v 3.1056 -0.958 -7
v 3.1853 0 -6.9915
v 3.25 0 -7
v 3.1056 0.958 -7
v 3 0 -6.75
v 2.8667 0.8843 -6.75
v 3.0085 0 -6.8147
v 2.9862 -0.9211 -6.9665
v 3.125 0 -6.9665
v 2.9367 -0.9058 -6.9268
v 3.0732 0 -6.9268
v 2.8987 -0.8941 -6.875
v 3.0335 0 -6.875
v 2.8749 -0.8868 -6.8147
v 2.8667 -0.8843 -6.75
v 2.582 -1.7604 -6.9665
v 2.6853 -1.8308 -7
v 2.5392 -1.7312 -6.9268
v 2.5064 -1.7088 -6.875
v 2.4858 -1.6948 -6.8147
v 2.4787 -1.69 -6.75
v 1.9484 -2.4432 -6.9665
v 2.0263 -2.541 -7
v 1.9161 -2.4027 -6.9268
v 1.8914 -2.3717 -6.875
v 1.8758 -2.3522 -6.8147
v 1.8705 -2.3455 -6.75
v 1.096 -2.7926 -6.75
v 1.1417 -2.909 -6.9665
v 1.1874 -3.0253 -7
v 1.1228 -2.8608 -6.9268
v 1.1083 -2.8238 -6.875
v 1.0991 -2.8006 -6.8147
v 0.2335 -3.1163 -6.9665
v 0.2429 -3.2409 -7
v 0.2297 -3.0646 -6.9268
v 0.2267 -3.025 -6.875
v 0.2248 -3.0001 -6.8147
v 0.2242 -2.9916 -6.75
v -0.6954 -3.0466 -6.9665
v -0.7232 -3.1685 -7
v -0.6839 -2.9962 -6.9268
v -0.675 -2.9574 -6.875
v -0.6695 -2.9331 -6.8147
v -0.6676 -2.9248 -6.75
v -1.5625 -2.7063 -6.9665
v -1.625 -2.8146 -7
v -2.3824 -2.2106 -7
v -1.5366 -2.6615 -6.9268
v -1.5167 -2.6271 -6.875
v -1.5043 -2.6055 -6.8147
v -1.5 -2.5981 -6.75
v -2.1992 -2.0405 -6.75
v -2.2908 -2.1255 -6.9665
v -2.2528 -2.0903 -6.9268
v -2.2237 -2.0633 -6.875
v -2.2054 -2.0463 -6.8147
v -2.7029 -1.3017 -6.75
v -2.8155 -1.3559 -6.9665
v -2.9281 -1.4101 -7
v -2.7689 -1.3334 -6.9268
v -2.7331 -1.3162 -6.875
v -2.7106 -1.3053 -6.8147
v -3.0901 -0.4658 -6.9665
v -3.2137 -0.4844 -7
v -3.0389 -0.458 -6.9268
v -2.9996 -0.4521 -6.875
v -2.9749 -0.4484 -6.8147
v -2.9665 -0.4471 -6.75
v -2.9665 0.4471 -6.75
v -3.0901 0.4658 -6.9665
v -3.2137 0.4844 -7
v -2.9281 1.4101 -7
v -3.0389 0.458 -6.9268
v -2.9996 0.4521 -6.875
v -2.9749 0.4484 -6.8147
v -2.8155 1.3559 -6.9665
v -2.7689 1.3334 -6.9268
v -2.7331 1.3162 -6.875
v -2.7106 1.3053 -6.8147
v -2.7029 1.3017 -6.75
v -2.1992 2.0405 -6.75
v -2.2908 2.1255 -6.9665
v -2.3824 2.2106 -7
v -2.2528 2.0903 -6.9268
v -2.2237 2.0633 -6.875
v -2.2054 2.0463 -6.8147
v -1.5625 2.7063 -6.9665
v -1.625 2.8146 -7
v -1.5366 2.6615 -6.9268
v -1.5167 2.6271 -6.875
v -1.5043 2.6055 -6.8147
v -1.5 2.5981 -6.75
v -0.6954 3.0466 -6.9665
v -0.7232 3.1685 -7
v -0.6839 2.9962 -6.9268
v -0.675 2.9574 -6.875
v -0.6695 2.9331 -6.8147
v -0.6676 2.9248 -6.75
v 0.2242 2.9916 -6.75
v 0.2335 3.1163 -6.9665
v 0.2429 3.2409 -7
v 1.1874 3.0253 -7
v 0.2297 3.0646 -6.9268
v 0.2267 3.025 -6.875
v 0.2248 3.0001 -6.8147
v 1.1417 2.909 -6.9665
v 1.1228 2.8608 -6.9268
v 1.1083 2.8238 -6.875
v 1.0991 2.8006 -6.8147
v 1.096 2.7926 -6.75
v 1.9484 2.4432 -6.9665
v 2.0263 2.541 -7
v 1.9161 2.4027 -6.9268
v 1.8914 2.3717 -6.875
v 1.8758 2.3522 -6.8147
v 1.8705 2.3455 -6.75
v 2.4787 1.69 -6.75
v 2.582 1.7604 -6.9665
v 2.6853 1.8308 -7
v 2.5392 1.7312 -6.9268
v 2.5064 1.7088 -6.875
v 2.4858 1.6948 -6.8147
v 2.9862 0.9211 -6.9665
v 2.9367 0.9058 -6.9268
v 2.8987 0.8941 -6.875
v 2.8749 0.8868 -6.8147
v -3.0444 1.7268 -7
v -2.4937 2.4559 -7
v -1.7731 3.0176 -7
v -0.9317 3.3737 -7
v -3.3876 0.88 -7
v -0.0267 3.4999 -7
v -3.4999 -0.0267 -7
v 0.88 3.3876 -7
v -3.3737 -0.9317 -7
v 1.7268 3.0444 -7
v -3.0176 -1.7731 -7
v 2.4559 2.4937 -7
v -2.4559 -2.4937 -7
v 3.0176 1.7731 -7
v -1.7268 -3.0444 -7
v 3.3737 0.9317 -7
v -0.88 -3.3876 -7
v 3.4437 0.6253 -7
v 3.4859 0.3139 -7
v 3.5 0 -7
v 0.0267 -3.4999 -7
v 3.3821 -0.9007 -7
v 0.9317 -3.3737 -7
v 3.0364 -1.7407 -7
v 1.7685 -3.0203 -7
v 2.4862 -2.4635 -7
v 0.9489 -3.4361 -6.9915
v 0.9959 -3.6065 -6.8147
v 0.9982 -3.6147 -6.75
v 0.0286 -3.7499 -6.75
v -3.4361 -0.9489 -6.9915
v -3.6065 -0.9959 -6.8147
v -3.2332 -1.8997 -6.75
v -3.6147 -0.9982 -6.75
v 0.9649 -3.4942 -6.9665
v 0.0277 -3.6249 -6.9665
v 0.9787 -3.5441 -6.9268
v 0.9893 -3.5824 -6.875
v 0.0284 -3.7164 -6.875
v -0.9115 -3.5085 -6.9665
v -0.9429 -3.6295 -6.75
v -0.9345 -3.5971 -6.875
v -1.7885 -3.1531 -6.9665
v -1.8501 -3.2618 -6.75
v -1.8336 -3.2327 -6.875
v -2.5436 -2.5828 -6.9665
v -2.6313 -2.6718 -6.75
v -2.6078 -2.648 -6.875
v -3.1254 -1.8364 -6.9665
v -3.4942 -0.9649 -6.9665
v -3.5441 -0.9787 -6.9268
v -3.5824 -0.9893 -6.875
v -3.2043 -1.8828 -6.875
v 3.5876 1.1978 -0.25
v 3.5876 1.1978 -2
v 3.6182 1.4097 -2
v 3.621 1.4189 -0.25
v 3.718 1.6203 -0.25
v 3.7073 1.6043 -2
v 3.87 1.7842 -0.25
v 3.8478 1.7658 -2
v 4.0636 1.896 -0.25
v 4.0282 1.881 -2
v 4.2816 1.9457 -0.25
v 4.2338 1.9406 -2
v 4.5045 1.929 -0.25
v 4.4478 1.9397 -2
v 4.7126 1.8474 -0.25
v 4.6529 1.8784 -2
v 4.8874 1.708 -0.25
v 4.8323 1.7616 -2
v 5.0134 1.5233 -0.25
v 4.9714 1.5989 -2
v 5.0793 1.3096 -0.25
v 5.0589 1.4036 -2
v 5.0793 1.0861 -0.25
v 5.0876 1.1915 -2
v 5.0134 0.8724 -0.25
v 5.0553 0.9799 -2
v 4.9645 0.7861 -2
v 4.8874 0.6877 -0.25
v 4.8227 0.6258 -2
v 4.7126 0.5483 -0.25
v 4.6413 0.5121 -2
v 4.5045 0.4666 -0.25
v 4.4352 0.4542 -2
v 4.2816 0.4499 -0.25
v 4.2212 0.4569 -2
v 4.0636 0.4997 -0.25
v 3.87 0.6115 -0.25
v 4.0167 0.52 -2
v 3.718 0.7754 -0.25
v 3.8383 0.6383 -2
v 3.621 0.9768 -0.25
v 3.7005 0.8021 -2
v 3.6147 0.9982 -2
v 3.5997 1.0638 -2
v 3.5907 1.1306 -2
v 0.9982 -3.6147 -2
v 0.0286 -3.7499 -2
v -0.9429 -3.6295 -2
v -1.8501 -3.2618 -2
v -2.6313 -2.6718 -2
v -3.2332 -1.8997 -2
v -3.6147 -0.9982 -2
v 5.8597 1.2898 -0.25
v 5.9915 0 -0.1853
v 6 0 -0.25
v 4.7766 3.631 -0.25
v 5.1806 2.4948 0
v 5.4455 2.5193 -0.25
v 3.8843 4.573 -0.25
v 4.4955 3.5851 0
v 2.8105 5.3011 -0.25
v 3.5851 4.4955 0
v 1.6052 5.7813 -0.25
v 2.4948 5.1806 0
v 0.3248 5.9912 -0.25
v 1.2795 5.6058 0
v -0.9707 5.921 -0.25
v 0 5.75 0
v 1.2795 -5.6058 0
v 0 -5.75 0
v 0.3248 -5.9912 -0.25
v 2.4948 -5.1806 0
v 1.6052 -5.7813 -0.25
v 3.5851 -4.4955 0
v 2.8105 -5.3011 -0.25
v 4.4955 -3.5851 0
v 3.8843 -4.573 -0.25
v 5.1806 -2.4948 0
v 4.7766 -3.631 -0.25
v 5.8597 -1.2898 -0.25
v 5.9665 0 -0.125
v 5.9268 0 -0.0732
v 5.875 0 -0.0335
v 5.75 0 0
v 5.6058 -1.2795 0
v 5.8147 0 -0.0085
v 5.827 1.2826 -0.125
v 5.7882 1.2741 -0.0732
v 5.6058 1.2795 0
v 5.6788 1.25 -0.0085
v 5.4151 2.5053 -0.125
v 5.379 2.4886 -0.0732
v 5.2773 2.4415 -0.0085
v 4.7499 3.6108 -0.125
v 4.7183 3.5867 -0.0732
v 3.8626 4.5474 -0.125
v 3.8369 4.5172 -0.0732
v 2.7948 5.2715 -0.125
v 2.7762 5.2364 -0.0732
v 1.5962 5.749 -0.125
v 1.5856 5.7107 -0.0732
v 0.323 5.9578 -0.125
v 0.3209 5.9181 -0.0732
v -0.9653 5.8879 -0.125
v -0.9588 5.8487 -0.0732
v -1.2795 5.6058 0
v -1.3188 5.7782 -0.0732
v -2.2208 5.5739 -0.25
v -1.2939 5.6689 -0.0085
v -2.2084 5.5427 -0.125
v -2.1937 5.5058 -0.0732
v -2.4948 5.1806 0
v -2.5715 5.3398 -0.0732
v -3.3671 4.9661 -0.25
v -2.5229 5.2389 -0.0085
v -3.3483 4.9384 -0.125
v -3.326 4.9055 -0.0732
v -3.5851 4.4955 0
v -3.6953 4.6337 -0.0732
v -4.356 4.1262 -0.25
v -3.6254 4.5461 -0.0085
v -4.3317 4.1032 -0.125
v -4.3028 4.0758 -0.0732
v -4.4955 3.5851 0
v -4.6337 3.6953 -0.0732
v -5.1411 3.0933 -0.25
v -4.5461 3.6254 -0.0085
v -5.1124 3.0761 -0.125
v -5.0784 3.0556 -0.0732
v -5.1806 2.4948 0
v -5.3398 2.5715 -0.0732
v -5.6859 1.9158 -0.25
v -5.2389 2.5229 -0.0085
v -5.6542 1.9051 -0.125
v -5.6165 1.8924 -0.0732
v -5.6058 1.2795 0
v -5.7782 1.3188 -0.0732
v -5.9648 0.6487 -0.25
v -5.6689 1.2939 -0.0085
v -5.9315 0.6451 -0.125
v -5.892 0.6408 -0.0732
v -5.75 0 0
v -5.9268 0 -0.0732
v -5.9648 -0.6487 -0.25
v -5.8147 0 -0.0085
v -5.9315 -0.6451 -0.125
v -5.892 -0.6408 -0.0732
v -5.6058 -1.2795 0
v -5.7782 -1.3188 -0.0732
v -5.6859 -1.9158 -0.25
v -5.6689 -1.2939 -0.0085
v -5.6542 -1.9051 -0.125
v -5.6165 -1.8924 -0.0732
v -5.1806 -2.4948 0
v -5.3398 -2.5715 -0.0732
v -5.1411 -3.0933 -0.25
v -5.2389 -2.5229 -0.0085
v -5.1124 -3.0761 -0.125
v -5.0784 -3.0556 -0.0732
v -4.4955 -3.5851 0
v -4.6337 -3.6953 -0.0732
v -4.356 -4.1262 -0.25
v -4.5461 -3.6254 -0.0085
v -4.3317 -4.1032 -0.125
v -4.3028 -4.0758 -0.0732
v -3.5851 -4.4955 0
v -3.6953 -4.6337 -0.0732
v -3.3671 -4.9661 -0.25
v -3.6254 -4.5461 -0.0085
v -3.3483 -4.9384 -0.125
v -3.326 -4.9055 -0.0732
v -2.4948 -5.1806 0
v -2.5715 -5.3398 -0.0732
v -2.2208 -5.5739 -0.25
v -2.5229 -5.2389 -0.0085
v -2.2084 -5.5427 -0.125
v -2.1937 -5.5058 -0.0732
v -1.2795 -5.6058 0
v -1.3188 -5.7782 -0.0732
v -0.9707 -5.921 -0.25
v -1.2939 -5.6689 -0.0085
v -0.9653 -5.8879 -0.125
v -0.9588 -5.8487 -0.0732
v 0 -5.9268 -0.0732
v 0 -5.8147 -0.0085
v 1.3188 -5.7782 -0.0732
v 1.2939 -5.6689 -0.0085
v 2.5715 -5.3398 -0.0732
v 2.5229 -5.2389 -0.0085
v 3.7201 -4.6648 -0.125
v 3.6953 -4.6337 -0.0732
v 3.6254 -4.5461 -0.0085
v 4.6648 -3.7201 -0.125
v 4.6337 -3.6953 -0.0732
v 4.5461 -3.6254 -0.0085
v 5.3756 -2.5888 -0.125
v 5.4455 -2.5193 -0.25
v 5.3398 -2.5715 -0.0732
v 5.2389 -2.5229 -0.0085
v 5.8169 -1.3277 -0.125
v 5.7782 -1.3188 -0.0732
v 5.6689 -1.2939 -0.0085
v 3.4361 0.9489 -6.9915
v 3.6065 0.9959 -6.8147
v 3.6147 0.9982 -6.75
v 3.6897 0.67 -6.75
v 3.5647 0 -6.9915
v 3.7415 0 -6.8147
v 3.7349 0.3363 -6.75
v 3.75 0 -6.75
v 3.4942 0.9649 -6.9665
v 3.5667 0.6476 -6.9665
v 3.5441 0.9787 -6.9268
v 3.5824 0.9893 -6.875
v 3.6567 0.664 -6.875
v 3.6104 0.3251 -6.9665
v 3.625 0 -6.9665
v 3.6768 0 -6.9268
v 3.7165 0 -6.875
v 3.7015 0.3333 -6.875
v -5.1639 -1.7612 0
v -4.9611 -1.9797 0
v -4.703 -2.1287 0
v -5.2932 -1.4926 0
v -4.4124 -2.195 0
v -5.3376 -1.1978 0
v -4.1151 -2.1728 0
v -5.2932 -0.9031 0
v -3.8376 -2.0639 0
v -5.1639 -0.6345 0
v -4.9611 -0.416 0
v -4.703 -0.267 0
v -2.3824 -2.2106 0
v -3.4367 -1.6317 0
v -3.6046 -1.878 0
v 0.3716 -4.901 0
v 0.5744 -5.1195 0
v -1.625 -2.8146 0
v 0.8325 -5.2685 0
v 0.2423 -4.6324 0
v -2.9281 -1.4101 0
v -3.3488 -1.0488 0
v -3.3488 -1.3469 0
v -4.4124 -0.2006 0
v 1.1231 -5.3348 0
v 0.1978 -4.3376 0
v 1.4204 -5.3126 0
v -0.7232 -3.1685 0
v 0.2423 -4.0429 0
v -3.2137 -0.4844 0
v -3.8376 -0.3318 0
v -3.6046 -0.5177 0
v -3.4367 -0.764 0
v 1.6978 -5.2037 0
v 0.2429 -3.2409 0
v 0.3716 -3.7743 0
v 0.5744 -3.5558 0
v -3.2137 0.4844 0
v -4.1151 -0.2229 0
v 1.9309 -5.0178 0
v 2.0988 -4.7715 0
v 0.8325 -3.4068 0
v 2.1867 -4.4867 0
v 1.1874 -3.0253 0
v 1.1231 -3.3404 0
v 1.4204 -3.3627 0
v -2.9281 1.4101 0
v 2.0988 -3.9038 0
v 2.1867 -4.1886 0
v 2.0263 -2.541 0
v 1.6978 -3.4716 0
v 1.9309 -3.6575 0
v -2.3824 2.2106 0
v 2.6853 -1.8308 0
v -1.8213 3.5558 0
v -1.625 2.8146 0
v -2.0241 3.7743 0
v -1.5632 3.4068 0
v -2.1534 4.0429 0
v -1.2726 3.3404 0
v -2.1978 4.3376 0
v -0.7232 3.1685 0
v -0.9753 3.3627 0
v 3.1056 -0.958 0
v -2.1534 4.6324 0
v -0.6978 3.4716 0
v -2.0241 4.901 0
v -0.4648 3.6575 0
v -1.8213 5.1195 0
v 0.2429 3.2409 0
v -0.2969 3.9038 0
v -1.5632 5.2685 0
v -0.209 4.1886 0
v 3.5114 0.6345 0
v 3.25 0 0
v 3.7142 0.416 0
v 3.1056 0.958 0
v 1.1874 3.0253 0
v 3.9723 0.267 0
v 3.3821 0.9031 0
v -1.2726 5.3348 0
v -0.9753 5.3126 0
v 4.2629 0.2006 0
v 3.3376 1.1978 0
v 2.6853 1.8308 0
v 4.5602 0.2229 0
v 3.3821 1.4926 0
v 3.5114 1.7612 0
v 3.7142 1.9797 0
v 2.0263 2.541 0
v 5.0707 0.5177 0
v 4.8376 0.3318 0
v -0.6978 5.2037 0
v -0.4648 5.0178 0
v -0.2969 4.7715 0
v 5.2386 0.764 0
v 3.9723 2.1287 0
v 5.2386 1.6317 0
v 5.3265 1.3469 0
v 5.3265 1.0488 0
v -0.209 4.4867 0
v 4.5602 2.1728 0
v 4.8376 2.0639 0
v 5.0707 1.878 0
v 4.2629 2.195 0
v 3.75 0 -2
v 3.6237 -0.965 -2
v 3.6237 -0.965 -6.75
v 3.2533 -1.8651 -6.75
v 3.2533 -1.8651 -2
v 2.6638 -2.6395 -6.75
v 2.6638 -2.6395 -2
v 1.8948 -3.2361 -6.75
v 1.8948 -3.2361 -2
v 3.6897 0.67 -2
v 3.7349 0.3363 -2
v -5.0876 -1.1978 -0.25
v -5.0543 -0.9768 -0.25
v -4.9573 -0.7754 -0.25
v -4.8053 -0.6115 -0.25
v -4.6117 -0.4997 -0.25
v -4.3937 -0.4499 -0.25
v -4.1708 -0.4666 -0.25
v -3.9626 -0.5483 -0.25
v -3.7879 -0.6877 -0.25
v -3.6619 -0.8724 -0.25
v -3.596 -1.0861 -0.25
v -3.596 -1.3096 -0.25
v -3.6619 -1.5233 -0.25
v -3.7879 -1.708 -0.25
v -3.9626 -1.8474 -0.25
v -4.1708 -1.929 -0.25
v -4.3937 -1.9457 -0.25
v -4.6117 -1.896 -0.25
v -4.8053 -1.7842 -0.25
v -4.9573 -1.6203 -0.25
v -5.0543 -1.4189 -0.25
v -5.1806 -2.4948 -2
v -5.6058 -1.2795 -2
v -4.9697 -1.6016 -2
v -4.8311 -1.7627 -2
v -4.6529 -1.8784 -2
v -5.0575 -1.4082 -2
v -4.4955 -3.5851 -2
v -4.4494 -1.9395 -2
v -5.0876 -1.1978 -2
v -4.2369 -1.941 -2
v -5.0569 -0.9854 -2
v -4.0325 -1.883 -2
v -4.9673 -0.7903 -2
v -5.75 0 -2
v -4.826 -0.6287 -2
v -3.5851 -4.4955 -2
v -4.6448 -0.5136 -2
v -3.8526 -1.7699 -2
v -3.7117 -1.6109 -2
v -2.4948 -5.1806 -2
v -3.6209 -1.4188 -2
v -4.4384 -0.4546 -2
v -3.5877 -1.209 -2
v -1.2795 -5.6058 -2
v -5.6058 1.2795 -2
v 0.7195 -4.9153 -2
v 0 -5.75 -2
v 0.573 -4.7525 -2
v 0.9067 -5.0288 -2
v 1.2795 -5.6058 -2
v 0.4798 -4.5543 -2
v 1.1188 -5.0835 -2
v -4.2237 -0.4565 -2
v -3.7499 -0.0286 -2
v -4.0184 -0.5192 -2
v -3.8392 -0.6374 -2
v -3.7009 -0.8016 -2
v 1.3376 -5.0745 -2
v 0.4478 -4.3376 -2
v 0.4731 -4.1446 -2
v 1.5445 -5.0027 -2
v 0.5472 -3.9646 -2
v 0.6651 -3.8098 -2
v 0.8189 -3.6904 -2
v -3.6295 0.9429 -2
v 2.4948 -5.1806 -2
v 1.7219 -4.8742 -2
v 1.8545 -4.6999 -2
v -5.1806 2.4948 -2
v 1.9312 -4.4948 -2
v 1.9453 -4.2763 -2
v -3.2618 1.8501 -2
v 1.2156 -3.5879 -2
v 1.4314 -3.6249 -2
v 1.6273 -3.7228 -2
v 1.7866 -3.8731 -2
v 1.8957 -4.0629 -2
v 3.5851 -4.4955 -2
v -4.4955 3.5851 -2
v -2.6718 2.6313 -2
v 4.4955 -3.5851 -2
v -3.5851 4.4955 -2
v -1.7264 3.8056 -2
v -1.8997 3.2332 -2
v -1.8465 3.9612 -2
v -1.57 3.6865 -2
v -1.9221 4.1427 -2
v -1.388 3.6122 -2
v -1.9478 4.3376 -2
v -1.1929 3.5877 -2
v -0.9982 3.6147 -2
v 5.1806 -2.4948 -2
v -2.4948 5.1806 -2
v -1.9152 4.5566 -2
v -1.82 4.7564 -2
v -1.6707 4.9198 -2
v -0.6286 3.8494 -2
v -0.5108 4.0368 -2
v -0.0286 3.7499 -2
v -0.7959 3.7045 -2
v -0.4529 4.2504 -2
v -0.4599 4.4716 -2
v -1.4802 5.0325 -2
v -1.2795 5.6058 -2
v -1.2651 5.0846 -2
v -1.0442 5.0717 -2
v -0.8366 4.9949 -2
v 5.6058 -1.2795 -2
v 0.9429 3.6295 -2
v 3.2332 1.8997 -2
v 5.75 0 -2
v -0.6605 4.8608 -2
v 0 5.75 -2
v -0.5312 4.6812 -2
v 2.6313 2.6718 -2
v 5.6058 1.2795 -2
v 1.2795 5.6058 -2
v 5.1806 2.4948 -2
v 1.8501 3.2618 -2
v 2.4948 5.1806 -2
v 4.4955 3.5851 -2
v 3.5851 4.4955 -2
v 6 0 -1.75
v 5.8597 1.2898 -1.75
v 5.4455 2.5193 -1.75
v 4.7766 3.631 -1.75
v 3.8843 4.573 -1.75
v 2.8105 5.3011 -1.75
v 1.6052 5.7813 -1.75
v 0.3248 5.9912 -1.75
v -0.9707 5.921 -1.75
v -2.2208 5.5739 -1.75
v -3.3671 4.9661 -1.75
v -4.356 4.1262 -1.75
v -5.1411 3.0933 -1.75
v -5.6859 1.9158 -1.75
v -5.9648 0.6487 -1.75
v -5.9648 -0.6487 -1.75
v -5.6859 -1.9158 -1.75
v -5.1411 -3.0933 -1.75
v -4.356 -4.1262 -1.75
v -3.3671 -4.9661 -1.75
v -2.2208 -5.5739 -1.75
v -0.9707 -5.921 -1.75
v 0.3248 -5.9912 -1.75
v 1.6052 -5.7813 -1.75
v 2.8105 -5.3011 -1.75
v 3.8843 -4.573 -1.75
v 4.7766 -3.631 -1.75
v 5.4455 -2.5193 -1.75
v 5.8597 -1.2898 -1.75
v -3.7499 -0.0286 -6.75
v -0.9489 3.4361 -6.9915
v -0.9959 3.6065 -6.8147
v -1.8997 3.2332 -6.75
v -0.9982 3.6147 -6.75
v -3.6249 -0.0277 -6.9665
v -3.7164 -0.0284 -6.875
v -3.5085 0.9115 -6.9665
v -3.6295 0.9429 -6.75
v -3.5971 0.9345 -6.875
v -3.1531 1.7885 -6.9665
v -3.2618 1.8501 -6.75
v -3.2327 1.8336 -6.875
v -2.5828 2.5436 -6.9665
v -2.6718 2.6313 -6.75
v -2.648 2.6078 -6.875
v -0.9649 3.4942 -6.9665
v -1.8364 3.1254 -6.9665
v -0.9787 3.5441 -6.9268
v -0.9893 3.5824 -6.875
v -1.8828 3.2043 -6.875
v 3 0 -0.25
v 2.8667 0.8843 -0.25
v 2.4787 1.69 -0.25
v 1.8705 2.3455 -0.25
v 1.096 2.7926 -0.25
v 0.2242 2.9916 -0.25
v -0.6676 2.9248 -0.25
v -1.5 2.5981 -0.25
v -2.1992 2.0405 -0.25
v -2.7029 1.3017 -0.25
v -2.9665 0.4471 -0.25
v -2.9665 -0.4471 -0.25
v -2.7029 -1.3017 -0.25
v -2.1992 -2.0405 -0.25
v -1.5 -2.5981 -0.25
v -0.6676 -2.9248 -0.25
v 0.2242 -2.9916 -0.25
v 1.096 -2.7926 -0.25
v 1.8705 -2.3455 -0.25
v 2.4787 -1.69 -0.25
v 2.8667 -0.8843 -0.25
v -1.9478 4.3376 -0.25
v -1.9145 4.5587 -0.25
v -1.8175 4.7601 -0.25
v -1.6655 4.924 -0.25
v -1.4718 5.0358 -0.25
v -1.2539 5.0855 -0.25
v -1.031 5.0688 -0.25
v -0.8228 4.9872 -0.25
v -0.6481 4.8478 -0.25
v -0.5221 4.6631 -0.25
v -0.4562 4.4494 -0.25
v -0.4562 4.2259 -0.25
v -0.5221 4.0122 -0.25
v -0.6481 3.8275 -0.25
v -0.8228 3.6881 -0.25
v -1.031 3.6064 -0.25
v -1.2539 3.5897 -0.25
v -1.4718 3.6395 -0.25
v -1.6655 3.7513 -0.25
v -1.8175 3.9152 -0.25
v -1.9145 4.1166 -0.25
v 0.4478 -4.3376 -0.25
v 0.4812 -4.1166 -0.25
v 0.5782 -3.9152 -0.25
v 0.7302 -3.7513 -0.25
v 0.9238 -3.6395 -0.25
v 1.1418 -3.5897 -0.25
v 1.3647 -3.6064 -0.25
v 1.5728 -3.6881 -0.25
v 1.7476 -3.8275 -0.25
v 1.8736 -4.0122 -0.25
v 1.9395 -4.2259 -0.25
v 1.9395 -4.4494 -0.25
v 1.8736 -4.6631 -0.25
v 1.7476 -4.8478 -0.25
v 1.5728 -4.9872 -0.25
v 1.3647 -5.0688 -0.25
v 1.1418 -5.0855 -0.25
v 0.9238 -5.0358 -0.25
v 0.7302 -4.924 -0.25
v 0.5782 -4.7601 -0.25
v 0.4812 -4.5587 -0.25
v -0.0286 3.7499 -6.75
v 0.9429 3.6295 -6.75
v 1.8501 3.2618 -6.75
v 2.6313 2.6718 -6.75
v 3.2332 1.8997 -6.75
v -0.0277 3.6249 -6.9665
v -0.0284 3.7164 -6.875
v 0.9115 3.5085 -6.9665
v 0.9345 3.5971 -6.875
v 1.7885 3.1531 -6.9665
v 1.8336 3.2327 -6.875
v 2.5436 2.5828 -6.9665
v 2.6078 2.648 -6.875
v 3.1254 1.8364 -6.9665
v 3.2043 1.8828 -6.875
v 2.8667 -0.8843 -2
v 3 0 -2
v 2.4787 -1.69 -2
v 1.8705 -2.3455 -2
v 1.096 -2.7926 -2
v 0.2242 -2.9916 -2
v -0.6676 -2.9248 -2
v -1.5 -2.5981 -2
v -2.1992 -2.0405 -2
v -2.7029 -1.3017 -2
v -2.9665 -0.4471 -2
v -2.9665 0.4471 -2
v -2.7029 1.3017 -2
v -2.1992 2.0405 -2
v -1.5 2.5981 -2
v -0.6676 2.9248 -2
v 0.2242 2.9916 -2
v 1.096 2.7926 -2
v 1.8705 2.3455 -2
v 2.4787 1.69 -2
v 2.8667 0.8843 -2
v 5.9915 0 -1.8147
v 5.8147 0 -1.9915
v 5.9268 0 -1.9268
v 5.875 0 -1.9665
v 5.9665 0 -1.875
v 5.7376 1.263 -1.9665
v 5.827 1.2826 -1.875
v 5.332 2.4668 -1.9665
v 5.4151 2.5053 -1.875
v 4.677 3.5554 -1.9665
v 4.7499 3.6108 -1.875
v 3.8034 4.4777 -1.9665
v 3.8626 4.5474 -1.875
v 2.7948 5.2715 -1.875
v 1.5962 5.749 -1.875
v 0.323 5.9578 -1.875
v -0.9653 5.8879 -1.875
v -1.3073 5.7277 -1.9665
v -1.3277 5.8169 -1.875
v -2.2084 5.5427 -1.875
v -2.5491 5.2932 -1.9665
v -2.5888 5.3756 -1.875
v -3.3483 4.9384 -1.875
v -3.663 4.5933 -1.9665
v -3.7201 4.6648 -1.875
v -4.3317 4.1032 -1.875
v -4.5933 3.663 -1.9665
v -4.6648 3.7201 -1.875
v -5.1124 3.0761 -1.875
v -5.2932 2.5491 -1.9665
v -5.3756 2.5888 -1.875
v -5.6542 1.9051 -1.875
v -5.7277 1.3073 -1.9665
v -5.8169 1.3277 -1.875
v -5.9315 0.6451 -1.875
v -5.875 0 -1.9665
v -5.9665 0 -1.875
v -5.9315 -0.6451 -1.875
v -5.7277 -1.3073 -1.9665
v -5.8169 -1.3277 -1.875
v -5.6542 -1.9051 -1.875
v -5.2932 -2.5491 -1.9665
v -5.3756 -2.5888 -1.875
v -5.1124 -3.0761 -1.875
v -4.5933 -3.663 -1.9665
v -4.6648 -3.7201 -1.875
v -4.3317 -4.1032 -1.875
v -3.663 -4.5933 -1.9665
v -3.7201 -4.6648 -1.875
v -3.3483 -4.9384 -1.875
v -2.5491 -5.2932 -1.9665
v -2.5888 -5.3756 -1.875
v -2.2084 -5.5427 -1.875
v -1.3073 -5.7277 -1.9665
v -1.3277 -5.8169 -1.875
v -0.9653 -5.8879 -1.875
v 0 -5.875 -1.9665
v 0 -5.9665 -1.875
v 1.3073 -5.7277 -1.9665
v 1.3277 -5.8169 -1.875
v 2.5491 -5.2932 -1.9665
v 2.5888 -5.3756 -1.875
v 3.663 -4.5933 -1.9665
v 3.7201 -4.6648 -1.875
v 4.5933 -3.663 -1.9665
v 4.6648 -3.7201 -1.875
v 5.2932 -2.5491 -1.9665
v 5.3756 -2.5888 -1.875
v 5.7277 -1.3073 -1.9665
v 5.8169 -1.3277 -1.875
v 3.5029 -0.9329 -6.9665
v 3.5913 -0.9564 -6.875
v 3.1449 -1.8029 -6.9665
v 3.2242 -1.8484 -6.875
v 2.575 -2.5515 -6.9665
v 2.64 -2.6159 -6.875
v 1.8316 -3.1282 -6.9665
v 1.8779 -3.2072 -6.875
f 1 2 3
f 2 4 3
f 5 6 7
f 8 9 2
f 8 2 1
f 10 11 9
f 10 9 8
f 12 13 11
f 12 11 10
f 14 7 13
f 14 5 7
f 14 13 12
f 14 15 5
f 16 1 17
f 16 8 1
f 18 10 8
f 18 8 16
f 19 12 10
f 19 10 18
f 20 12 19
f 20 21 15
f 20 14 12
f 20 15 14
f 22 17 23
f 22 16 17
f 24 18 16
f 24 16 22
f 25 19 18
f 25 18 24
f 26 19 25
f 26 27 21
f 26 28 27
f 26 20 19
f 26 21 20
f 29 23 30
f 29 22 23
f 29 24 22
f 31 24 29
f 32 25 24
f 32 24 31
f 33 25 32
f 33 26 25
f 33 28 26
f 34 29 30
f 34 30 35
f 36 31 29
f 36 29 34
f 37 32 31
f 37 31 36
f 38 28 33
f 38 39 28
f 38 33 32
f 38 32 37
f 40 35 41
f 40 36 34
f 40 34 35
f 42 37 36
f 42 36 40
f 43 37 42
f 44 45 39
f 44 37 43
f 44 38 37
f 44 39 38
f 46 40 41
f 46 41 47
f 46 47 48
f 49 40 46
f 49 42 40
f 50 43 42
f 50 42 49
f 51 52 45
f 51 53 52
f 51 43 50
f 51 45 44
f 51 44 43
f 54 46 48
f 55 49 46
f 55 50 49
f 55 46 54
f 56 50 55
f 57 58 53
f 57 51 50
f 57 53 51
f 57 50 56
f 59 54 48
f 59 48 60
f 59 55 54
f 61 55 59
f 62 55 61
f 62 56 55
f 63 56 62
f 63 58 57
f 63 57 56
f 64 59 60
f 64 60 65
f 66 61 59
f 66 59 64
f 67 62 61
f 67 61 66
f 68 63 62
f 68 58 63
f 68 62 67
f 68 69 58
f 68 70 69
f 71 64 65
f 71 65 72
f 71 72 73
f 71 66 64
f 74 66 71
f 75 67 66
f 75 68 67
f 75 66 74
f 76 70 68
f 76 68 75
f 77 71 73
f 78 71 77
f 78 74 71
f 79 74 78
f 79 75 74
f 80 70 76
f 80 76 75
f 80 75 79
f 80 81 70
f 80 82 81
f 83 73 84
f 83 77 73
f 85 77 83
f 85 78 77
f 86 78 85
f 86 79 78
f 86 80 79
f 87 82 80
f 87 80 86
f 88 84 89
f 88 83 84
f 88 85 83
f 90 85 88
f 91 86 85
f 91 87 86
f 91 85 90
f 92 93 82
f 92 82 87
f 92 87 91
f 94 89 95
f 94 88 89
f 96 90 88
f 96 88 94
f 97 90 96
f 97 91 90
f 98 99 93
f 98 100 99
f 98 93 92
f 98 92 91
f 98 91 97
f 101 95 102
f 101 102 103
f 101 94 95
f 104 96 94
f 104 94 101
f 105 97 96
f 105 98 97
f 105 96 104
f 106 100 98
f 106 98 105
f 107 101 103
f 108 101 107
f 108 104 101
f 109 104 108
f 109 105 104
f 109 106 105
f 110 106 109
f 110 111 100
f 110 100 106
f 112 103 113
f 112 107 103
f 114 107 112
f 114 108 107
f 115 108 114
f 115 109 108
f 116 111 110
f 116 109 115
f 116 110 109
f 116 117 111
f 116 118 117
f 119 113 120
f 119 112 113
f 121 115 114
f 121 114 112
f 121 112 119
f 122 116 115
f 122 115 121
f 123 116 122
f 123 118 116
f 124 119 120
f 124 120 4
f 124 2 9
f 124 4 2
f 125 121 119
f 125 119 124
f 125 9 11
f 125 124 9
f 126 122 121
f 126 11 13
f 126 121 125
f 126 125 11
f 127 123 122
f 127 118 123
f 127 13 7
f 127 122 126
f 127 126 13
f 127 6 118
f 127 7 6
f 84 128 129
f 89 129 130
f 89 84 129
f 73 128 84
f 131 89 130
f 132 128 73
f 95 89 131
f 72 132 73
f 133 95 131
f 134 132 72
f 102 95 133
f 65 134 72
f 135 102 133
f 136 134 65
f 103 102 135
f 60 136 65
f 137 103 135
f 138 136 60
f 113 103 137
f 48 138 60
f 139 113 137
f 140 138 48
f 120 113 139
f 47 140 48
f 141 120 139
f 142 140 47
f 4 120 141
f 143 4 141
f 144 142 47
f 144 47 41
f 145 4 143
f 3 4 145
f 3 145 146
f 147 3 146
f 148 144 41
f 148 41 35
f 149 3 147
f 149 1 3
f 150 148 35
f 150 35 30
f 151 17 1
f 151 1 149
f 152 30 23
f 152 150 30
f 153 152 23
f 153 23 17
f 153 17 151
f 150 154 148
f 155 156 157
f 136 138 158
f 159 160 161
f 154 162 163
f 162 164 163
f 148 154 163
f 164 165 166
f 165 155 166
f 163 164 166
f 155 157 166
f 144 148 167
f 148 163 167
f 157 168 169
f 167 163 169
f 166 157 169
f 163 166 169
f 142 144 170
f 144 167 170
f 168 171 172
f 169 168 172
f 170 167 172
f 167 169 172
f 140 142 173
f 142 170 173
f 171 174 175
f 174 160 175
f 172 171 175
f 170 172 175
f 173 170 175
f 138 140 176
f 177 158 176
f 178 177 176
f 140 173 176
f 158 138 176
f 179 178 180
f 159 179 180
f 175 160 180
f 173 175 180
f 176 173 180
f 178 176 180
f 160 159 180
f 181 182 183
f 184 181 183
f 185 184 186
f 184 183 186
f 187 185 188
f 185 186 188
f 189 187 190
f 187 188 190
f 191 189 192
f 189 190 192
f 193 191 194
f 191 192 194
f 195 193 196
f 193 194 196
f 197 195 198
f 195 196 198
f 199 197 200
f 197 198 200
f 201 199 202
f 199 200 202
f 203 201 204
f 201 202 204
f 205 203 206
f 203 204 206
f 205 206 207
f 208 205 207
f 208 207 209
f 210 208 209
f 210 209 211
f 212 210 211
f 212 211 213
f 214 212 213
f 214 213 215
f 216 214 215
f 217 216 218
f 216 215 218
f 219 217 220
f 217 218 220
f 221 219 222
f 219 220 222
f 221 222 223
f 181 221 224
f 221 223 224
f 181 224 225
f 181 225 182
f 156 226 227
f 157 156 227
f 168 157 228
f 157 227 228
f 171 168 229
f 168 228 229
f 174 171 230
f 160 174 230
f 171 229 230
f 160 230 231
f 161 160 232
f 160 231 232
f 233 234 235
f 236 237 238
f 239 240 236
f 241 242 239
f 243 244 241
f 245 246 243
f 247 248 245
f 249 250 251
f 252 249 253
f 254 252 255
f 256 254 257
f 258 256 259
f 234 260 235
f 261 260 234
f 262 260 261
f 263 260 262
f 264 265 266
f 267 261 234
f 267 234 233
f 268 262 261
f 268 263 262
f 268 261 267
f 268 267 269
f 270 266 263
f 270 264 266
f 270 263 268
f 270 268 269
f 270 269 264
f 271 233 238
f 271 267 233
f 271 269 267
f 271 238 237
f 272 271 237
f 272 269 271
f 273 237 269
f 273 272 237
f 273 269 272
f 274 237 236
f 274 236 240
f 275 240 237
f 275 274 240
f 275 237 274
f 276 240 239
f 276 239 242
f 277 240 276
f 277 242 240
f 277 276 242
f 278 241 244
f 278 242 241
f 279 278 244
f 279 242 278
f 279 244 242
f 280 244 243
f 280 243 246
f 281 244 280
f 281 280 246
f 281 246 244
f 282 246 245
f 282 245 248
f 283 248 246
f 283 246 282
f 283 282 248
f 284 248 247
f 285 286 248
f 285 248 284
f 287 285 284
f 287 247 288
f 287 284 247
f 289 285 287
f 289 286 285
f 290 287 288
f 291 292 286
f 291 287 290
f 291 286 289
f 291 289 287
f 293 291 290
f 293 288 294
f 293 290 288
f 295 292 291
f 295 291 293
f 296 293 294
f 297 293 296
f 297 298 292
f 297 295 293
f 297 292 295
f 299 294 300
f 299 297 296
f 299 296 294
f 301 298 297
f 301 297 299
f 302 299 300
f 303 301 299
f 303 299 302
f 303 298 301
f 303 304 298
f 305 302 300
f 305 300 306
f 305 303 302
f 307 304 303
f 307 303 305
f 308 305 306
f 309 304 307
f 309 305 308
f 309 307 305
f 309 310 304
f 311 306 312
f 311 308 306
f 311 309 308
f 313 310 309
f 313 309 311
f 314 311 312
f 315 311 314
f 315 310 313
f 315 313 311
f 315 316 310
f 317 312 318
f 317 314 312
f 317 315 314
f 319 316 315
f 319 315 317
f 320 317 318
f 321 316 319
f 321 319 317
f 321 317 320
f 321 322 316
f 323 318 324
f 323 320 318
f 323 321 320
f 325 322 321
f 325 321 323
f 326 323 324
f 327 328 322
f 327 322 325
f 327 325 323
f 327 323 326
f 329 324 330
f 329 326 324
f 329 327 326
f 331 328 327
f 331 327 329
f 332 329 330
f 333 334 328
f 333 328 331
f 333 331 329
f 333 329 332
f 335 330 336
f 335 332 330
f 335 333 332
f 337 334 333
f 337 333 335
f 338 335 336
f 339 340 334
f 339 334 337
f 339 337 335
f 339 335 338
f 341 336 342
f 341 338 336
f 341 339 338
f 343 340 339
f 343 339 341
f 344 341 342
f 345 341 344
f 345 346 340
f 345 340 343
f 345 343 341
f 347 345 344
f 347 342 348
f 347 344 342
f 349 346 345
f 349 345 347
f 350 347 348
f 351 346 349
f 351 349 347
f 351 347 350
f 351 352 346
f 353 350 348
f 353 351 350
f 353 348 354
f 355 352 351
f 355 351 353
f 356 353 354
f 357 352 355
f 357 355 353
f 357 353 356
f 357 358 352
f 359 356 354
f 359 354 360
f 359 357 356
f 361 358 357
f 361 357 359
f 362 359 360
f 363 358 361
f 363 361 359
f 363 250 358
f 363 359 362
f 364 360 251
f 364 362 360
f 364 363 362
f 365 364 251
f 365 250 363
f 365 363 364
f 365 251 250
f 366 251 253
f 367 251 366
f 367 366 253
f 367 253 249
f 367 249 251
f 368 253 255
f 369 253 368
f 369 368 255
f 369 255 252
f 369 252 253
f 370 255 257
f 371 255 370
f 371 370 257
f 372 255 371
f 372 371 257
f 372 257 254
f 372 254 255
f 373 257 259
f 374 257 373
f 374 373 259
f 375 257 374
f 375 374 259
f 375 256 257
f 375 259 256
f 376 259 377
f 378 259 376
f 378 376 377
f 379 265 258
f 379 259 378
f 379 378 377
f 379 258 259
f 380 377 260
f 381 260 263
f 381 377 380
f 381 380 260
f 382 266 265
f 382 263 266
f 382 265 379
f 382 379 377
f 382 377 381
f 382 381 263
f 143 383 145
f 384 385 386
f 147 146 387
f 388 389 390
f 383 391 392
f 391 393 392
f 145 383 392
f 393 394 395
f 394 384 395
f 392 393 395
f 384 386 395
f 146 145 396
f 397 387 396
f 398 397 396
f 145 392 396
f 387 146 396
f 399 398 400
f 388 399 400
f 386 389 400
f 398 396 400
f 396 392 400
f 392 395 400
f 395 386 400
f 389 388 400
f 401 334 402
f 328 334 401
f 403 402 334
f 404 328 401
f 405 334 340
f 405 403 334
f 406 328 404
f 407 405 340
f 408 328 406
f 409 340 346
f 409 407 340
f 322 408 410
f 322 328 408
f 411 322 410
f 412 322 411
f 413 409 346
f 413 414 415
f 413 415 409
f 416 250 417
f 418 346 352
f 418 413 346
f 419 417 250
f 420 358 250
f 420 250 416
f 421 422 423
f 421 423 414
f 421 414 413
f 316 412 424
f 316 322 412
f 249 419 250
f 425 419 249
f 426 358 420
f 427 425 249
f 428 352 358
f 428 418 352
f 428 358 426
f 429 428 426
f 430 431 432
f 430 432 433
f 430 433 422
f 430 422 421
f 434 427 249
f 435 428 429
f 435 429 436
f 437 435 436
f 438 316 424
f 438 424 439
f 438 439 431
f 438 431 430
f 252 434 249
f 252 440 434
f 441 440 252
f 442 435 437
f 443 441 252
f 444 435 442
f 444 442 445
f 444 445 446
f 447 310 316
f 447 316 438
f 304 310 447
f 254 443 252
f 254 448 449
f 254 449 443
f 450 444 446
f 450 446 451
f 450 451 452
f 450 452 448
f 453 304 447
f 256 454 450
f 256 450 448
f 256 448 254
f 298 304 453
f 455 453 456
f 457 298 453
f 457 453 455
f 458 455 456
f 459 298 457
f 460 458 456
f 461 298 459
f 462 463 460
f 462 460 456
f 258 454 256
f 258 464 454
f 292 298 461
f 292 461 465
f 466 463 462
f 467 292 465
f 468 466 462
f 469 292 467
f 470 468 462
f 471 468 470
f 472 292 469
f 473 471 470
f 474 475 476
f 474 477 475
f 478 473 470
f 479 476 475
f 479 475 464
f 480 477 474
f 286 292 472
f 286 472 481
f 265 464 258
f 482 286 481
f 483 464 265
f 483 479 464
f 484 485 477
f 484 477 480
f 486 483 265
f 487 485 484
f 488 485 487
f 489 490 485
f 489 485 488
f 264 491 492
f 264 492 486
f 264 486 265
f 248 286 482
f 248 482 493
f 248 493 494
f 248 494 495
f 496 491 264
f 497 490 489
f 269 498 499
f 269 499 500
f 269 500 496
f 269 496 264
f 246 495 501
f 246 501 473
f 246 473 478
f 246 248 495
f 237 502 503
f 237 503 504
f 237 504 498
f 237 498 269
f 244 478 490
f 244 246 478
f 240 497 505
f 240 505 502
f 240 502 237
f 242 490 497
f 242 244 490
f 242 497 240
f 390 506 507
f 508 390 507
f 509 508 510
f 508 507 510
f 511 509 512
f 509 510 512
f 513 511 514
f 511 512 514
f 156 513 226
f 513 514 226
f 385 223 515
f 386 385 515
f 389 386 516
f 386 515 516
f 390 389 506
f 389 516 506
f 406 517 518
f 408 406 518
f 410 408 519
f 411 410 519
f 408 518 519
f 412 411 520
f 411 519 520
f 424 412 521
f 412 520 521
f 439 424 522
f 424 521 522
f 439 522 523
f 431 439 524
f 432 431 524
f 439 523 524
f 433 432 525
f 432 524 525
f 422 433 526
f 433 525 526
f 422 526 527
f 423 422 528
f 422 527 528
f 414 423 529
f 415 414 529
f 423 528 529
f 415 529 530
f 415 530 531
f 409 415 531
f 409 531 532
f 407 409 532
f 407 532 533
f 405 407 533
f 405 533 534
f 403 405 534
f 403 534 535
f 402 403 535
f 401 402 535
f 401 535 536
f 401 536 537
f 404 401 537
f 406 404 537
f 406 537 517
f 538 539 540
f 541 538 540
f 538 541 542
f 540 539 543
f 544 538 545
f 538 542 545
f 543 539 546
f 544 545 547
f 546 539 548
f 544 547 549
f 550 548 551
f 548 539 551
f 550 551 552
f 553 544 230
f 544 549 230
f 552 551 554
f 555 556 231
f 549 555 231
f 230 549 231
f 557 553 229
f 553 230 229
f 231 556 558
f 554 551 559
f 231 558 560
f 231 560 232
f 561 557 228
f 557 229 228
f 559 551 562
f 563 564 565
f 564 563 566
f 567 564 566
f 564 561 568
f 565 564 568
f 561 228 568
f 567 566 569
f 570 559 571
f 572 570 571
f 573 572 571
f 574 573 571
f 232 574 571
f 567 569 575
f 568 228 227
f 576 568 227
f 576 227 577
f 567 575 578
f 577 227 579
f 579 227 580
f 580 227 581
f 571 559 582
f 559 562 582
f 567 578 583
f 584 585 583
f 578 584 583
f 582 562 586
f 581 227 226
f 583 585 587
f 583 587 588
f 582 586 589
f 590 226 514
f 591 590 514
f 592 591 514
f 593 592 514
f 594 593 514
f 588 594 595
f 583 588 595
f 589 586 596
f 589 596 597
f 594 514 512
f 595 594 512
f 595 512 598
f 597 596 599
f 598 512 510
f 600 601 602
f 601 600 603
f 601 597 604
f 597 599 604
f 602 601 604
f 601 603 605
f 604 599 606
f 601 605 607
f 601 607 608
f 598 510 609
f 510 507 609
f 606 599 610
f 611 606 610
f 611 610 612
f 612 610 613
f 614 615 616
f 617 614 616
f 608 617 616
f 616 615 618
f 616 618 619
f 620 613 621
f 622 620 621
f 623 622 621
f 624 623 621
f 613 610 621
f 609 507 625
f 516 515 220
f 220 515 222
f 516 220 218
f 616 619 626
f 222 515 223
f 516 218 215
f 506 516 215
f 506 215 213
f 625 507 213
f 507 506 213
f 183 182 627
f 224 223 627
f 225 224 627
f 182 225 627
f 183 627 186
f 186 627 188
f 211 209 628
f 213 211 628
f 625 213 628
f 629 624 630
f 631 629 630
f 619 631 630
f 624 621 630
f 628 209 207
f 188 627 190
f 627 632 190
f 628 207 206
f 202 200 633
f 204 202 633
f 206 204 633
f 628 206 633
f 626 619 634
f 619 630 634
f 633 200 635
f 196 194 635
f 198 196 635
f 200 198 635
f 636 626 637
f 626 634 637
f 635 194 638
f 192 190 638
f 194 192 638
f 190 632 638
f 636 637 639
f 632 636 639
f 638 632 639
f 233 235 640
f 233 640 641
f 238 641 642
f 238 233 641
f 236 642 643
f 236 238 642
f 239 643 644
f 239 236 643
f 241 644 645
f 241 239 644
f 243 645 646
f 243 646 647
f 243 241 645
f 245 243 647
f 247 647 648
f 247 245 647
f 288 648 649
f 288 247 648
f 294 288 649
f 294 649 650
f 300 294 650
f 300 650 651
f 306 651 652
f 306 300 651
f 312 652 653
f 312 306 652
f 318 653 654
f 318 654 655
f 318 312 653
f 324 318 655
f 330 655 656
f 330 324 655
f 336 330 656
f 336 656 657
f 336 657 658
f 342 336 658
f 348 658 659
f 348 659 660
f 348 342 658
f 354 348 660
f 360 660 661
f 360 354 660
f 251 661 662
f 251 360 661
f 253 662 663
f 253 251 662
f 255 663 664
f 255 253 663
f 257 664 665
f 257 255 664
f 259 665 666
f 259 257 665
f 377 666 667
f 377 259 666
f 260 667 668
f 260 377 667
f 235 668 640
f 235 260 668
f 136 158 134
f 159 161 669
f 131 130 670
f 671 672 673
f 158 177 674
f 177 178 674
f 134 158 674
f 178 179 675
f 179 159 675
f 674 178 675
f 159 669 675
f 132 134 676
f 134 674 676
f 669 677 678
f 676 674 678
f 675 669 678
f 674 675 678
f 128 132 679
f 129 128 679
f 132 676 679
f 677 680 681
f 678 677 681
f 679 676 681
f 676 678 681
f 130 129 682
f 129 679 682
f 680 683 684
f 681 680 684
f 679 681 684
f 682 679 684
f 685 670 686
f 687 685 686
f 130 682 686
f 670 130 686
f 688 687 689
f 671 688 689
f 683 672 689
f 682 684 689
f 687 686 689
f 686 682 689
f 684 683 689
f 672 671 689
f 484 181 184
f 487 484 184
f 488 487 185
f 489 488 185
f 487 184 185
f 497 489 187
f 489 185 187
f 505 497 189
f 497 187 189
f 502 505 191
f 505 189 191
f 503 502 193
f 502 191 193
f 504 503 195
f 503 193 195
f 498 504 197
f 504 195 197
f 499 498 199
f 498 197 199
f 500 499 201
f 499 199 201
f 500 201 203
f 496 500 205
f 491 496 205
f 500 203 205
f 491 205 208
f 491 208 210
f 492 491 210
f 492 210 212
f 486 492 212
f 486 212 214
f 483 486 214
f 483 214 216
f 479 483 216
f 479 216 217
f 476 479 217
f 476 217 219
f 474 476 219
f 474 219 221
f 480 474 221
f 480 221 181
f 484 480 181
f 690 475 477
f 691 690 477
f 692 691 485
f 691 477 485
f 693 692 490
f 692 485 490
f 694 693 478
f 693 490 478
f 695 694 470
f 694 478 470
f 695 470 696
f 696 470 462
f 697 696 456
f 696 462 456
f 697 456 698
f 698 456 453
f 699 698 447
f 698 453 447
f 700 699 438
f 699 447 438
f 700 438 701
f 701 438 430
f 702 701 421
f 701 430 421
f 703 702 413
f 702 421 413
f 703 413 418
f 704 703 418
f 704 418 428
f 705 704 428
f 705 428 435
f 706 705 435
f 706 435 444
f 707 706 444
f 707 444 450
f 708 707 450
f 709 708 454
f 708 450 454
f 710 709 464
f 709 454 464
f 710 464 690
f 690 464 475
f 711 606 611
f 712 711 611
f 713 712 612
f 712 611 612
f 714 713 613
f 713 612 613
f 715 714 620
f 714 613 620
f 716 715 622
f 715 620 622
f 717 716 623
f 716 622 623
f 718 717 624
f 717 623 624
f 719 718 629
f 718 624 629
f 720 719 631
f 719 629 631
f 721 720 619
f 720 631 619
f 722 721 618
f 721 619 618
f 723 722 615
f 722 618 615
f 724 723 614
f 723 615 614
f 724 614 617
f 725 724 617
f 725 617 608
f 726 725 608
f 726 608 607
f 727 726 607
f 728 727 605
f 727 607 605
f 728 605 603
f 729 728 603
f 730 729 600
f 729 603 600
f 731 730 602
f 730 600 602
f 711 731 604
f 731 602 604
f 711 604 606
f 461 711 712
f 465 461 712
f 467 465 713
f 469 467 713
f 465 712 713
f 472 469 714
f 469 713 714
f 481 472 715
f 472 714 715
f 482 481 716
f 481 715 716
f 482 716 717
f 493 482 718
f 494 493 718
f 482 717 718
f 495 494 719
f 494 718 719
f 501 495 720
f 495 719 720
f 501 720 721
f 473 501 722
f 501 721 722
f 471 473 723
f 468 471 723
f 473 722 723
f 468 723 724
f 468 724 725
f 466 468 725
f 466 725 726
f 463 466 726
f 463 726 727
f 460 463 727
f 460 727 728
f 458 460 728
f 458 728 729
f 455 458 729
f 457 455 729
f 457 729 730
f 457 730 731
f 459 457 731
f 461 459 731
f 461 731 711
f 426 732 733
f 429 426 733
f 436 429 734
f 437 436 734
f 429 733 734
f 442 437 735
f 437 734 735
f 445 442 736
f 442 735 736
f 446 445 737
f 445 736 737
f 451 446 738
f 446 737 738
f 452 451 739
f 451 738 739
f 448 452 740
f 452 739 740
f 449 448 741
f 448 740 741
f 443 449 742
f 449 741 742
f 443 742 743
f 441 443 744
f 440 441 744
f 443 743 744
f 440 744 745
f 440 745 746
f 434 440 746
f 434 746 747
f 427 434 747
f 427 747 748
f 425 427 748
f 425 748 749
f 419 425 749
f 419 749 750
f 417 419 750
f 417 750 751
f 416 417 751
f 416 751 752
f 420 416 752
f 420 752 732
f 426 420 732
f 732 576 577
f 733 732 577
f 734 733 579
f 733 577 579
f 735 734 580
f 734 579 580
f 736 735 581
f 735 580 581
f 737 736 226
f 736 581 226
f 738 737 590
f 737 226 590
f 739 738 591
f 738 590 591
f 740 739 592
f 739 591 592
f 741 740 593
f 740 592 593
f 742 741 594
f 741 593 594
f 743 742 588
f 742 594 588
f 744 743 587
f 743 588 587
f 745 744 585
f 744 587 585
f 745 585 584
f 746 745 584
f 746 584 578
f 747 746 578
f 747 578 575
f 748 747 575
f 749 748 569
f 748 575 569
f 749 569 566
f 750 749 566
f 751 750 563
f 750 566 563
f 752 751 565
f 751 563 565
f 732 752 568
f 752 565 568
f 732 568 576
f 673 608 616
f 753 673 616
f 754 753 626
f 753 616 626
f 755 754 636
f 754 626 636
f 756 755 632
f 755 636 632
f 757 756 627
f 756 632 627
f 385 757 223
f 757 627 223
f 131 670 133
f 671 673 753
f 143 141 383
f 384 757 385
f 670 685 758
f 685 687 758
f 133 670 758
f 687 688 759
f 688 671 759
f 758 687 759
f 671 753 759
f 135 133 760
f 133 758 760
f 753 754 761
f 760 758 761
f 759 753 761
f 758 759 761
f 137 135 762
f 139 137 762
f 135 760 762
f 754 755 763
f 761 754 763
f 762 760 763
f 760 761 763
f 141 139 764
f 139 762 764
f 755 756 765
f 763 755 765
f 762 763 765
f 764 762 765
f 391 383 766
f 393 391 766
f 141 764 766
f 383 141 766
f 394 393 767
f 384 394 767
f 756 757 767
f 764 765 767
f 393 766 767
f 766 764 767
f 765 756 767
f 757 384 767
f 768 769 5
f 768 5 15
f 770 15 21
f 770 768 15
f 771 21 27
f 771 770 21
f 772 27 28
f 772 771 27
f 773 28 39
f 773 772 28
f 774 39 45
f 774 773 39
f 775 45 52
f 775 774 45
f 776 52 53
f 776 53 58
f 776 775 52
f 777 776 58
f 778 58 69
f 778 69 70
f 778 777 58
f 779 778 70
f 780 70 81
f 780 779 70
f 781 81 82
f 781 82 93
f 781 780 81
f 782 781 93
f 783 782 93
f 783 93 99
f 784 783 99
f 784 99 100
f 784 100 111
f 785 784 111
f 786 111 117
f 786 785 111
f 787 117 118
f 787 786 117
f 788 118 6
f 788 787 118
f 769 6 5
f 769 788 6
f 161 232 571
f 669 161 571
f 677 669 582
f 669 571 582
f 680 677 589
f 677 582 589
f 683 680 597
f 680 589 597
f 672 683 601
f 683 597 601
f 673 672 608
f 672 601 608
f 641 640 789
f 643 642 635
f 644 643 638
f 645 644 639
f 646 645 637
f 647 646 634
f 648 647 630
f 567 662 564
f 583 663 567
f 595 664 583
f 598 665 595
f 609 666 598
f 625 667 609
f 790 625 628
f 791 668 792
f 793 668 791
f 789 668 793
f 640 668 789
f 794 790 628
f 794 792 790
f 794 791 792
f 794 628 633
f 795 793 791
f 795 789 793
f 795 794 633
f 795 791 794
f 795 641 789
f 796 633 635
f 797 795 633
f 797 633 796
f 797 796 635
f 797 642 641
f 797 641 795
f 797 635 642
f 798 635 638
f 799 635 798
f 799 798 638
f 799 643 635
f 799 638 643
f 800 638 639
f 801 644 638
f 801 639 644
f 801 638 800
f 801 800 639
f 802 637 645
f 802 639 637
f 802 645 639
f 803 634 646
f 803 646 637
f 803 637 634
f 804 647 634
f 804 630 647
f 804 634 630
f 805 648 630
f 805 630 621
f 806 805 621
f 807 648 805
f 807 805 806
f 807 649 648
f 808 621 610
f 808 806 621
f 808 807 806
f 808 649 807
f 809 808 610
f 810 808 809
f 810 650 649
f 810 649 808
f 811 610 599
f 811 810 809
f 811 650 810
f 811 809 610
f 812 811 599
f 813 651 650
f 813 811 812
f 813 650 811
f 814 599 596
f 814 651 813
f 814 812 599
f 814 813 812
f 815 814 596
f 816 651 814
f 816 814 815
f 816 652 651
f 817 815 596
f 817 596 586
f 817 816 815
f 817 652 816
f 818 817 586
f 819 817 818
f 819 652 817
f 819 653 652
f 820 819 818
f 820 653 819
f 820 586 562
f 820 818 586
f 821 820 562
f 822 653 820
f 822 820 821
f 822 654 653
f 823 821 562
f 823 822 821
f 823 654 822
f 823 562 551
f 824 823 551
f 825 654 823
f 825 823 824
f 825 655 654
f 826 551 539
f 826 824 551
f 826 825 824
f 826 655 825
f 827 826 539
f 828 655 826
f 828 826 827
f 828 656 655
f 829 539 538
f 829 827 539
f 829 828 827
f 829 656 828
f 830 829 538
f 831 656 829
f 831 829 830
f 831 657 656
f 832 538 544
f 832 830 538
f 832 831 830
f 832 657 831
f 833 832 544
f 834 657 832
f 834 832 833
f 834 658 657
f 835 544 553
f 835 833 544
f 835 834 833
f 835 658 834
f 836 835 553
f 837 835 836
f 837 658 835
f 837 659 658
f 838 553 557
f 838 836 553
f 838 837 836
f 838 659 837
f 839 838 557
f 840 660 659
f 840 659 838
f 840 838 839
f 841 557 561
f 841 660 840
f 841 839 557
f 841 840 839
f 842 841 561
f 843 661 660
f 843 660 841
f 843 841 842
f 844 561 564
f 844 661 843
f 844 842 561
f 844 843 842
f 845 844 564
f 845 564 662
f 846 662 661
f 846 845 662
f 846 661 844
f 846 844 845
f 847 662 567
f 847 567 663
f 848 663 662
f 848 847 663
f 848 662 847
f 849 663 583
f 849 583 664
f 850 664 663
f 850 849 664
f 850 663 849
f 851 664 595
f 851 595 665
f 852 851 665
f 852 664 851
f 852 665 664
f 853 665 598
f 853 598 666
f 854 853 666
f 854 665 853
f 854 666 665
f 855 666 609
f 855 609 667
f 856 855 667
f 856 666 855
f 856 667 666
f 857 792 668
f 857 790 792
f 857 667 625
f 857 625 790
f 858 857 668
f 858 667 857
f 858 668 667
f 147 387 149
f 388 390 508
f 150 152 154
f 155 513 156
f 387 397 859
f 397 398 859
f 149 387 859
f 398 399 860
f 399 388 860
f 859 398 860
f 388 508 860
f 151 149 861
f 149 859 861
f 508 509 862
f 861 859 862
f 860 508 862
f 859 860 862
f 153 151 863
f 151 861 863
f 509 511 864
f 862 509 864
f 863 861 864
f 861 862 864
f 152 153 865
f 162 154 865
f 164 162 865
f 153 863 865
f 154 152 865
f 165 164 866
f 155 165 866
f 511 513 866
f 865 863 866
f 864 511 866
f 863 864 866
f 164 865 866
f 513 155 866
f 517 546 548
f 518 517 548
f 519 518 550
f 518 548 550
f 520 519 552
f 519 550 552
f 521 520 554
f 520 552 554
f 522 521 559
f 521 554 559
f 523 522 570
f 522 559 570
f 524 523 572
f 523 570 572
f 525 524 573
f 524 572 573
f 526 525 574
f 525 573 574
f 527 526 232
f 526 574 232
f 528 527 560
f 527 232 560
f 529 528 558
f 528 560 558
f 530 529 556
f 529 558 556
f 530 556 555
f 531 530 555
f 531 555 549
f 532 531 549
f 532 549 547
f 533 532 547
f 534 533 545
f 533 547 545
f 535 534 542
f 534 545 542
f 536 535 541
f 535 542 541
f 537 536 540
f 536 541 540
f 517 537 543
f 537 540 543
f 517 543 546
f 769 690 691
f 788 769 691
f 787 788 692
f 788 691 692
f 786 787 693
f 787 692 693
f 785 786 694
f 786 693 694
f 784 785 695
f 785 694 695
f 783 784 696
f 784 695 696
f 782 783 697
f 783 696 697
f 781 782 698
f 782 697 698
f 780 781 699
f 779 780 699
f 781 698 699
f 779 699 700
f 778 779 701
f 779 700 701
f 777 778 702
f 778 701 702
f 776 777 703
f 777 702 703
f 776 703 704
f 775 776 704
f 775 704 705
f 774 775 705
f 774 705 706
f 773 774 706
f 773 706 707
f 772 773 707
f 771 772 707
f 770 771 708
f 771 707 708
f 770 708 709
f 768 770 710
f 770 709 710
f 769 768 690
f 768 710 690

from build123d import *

# Parameters (mm, degrees)
F0_R           = 6
F0_R_2         = 3
F1_DEPTH       = 2
F2_D           = 1.5
F2_CSINK_D     = 2
F2_CSINK_ANGLE = 90
F3_SIZE        = 0.25
F4_R           = 3
F5_DEPTH       = 5
F6_R           = 0.25
F7_R           = 0.25


with BuildPart() as f1:
    # F0 (on Top) → F1 (new body)
    with BuildSketch(Plane.XY):
        Circle(F0_R)
        Circle(F0_R_2, mode=Mode.SUBTRACT)
    extrude(amount=-F1_DEPTH)

    # F2 (through all)
    with Locations(Plane.XY):
        with Locations((-1.1978440184, 4.3376456411), (1.1978440184, -4.3376456411), (-4.3376456411, -1.1978440184), (4.3376456411, 1.1978440184)):
            CounterSinkHole(F2_D / 2, F2_CSINK_D / 2, counter_sink_angle=F2_CSINK_ANGLE)

    # F3
    f3_edges = [f1.edges().sort_by_distance(p)[0] for p in [
        (-3, 0, 0),
    ]]
    chamfer(f3_edges, length=F3_SIZE)

    # F4 (on face) → F5 (join)
    with BuildSketch(Plane(origin=(0, 0, -2), x_dir=(1, 0, 0), z_dir=(0, 0, -1))):
        with BuildLine():
            ThreePointArc((3.6147047033, -0.99820334), (3.7160222441, -0.5036652473), (3.75, 0))
            ThreePointArc((3.75, 0), (2.9837696475, 2.2714794057), (0.9982033651, 3.6147046964))
            ThreePointArc((0.9982033651, 3.6147046964), (-1.8501458456, 3.2618185648), (-3.6147047033, 0.99820334))
            ThreePointArc((-3.6147047033, 0.99820334), (-3.2618185584, -1.850145857), (-0.99820334, -3.6147047033))
            ThreePointArc((-0.99820334, -3.6147047033), (1.850145857, -3.2618185584), (3.6147047033, -0.99820334))
        make_face()
        Circle(F4_R, mode=Mode.SUBTRACT)
    extrude(amount=F5_DEPTH)

    # F6
    f6_edges = [f1.edges().sort_by_distance(p)[0] for p in [
        (-3, 0, -7),
        (-3.614705, -0.998203, -7),
    ]]
    fillet(f6_edges, radius=F6_R)

    # F7
    f7_edges = [f1.edges().sort_by_distance(p)[0] for p in [
        (-6, 0, 0),
        (-6, 0, -2),
    ]]
    fillet(f7_edges, radius=F7_R)


solid = f1.part
